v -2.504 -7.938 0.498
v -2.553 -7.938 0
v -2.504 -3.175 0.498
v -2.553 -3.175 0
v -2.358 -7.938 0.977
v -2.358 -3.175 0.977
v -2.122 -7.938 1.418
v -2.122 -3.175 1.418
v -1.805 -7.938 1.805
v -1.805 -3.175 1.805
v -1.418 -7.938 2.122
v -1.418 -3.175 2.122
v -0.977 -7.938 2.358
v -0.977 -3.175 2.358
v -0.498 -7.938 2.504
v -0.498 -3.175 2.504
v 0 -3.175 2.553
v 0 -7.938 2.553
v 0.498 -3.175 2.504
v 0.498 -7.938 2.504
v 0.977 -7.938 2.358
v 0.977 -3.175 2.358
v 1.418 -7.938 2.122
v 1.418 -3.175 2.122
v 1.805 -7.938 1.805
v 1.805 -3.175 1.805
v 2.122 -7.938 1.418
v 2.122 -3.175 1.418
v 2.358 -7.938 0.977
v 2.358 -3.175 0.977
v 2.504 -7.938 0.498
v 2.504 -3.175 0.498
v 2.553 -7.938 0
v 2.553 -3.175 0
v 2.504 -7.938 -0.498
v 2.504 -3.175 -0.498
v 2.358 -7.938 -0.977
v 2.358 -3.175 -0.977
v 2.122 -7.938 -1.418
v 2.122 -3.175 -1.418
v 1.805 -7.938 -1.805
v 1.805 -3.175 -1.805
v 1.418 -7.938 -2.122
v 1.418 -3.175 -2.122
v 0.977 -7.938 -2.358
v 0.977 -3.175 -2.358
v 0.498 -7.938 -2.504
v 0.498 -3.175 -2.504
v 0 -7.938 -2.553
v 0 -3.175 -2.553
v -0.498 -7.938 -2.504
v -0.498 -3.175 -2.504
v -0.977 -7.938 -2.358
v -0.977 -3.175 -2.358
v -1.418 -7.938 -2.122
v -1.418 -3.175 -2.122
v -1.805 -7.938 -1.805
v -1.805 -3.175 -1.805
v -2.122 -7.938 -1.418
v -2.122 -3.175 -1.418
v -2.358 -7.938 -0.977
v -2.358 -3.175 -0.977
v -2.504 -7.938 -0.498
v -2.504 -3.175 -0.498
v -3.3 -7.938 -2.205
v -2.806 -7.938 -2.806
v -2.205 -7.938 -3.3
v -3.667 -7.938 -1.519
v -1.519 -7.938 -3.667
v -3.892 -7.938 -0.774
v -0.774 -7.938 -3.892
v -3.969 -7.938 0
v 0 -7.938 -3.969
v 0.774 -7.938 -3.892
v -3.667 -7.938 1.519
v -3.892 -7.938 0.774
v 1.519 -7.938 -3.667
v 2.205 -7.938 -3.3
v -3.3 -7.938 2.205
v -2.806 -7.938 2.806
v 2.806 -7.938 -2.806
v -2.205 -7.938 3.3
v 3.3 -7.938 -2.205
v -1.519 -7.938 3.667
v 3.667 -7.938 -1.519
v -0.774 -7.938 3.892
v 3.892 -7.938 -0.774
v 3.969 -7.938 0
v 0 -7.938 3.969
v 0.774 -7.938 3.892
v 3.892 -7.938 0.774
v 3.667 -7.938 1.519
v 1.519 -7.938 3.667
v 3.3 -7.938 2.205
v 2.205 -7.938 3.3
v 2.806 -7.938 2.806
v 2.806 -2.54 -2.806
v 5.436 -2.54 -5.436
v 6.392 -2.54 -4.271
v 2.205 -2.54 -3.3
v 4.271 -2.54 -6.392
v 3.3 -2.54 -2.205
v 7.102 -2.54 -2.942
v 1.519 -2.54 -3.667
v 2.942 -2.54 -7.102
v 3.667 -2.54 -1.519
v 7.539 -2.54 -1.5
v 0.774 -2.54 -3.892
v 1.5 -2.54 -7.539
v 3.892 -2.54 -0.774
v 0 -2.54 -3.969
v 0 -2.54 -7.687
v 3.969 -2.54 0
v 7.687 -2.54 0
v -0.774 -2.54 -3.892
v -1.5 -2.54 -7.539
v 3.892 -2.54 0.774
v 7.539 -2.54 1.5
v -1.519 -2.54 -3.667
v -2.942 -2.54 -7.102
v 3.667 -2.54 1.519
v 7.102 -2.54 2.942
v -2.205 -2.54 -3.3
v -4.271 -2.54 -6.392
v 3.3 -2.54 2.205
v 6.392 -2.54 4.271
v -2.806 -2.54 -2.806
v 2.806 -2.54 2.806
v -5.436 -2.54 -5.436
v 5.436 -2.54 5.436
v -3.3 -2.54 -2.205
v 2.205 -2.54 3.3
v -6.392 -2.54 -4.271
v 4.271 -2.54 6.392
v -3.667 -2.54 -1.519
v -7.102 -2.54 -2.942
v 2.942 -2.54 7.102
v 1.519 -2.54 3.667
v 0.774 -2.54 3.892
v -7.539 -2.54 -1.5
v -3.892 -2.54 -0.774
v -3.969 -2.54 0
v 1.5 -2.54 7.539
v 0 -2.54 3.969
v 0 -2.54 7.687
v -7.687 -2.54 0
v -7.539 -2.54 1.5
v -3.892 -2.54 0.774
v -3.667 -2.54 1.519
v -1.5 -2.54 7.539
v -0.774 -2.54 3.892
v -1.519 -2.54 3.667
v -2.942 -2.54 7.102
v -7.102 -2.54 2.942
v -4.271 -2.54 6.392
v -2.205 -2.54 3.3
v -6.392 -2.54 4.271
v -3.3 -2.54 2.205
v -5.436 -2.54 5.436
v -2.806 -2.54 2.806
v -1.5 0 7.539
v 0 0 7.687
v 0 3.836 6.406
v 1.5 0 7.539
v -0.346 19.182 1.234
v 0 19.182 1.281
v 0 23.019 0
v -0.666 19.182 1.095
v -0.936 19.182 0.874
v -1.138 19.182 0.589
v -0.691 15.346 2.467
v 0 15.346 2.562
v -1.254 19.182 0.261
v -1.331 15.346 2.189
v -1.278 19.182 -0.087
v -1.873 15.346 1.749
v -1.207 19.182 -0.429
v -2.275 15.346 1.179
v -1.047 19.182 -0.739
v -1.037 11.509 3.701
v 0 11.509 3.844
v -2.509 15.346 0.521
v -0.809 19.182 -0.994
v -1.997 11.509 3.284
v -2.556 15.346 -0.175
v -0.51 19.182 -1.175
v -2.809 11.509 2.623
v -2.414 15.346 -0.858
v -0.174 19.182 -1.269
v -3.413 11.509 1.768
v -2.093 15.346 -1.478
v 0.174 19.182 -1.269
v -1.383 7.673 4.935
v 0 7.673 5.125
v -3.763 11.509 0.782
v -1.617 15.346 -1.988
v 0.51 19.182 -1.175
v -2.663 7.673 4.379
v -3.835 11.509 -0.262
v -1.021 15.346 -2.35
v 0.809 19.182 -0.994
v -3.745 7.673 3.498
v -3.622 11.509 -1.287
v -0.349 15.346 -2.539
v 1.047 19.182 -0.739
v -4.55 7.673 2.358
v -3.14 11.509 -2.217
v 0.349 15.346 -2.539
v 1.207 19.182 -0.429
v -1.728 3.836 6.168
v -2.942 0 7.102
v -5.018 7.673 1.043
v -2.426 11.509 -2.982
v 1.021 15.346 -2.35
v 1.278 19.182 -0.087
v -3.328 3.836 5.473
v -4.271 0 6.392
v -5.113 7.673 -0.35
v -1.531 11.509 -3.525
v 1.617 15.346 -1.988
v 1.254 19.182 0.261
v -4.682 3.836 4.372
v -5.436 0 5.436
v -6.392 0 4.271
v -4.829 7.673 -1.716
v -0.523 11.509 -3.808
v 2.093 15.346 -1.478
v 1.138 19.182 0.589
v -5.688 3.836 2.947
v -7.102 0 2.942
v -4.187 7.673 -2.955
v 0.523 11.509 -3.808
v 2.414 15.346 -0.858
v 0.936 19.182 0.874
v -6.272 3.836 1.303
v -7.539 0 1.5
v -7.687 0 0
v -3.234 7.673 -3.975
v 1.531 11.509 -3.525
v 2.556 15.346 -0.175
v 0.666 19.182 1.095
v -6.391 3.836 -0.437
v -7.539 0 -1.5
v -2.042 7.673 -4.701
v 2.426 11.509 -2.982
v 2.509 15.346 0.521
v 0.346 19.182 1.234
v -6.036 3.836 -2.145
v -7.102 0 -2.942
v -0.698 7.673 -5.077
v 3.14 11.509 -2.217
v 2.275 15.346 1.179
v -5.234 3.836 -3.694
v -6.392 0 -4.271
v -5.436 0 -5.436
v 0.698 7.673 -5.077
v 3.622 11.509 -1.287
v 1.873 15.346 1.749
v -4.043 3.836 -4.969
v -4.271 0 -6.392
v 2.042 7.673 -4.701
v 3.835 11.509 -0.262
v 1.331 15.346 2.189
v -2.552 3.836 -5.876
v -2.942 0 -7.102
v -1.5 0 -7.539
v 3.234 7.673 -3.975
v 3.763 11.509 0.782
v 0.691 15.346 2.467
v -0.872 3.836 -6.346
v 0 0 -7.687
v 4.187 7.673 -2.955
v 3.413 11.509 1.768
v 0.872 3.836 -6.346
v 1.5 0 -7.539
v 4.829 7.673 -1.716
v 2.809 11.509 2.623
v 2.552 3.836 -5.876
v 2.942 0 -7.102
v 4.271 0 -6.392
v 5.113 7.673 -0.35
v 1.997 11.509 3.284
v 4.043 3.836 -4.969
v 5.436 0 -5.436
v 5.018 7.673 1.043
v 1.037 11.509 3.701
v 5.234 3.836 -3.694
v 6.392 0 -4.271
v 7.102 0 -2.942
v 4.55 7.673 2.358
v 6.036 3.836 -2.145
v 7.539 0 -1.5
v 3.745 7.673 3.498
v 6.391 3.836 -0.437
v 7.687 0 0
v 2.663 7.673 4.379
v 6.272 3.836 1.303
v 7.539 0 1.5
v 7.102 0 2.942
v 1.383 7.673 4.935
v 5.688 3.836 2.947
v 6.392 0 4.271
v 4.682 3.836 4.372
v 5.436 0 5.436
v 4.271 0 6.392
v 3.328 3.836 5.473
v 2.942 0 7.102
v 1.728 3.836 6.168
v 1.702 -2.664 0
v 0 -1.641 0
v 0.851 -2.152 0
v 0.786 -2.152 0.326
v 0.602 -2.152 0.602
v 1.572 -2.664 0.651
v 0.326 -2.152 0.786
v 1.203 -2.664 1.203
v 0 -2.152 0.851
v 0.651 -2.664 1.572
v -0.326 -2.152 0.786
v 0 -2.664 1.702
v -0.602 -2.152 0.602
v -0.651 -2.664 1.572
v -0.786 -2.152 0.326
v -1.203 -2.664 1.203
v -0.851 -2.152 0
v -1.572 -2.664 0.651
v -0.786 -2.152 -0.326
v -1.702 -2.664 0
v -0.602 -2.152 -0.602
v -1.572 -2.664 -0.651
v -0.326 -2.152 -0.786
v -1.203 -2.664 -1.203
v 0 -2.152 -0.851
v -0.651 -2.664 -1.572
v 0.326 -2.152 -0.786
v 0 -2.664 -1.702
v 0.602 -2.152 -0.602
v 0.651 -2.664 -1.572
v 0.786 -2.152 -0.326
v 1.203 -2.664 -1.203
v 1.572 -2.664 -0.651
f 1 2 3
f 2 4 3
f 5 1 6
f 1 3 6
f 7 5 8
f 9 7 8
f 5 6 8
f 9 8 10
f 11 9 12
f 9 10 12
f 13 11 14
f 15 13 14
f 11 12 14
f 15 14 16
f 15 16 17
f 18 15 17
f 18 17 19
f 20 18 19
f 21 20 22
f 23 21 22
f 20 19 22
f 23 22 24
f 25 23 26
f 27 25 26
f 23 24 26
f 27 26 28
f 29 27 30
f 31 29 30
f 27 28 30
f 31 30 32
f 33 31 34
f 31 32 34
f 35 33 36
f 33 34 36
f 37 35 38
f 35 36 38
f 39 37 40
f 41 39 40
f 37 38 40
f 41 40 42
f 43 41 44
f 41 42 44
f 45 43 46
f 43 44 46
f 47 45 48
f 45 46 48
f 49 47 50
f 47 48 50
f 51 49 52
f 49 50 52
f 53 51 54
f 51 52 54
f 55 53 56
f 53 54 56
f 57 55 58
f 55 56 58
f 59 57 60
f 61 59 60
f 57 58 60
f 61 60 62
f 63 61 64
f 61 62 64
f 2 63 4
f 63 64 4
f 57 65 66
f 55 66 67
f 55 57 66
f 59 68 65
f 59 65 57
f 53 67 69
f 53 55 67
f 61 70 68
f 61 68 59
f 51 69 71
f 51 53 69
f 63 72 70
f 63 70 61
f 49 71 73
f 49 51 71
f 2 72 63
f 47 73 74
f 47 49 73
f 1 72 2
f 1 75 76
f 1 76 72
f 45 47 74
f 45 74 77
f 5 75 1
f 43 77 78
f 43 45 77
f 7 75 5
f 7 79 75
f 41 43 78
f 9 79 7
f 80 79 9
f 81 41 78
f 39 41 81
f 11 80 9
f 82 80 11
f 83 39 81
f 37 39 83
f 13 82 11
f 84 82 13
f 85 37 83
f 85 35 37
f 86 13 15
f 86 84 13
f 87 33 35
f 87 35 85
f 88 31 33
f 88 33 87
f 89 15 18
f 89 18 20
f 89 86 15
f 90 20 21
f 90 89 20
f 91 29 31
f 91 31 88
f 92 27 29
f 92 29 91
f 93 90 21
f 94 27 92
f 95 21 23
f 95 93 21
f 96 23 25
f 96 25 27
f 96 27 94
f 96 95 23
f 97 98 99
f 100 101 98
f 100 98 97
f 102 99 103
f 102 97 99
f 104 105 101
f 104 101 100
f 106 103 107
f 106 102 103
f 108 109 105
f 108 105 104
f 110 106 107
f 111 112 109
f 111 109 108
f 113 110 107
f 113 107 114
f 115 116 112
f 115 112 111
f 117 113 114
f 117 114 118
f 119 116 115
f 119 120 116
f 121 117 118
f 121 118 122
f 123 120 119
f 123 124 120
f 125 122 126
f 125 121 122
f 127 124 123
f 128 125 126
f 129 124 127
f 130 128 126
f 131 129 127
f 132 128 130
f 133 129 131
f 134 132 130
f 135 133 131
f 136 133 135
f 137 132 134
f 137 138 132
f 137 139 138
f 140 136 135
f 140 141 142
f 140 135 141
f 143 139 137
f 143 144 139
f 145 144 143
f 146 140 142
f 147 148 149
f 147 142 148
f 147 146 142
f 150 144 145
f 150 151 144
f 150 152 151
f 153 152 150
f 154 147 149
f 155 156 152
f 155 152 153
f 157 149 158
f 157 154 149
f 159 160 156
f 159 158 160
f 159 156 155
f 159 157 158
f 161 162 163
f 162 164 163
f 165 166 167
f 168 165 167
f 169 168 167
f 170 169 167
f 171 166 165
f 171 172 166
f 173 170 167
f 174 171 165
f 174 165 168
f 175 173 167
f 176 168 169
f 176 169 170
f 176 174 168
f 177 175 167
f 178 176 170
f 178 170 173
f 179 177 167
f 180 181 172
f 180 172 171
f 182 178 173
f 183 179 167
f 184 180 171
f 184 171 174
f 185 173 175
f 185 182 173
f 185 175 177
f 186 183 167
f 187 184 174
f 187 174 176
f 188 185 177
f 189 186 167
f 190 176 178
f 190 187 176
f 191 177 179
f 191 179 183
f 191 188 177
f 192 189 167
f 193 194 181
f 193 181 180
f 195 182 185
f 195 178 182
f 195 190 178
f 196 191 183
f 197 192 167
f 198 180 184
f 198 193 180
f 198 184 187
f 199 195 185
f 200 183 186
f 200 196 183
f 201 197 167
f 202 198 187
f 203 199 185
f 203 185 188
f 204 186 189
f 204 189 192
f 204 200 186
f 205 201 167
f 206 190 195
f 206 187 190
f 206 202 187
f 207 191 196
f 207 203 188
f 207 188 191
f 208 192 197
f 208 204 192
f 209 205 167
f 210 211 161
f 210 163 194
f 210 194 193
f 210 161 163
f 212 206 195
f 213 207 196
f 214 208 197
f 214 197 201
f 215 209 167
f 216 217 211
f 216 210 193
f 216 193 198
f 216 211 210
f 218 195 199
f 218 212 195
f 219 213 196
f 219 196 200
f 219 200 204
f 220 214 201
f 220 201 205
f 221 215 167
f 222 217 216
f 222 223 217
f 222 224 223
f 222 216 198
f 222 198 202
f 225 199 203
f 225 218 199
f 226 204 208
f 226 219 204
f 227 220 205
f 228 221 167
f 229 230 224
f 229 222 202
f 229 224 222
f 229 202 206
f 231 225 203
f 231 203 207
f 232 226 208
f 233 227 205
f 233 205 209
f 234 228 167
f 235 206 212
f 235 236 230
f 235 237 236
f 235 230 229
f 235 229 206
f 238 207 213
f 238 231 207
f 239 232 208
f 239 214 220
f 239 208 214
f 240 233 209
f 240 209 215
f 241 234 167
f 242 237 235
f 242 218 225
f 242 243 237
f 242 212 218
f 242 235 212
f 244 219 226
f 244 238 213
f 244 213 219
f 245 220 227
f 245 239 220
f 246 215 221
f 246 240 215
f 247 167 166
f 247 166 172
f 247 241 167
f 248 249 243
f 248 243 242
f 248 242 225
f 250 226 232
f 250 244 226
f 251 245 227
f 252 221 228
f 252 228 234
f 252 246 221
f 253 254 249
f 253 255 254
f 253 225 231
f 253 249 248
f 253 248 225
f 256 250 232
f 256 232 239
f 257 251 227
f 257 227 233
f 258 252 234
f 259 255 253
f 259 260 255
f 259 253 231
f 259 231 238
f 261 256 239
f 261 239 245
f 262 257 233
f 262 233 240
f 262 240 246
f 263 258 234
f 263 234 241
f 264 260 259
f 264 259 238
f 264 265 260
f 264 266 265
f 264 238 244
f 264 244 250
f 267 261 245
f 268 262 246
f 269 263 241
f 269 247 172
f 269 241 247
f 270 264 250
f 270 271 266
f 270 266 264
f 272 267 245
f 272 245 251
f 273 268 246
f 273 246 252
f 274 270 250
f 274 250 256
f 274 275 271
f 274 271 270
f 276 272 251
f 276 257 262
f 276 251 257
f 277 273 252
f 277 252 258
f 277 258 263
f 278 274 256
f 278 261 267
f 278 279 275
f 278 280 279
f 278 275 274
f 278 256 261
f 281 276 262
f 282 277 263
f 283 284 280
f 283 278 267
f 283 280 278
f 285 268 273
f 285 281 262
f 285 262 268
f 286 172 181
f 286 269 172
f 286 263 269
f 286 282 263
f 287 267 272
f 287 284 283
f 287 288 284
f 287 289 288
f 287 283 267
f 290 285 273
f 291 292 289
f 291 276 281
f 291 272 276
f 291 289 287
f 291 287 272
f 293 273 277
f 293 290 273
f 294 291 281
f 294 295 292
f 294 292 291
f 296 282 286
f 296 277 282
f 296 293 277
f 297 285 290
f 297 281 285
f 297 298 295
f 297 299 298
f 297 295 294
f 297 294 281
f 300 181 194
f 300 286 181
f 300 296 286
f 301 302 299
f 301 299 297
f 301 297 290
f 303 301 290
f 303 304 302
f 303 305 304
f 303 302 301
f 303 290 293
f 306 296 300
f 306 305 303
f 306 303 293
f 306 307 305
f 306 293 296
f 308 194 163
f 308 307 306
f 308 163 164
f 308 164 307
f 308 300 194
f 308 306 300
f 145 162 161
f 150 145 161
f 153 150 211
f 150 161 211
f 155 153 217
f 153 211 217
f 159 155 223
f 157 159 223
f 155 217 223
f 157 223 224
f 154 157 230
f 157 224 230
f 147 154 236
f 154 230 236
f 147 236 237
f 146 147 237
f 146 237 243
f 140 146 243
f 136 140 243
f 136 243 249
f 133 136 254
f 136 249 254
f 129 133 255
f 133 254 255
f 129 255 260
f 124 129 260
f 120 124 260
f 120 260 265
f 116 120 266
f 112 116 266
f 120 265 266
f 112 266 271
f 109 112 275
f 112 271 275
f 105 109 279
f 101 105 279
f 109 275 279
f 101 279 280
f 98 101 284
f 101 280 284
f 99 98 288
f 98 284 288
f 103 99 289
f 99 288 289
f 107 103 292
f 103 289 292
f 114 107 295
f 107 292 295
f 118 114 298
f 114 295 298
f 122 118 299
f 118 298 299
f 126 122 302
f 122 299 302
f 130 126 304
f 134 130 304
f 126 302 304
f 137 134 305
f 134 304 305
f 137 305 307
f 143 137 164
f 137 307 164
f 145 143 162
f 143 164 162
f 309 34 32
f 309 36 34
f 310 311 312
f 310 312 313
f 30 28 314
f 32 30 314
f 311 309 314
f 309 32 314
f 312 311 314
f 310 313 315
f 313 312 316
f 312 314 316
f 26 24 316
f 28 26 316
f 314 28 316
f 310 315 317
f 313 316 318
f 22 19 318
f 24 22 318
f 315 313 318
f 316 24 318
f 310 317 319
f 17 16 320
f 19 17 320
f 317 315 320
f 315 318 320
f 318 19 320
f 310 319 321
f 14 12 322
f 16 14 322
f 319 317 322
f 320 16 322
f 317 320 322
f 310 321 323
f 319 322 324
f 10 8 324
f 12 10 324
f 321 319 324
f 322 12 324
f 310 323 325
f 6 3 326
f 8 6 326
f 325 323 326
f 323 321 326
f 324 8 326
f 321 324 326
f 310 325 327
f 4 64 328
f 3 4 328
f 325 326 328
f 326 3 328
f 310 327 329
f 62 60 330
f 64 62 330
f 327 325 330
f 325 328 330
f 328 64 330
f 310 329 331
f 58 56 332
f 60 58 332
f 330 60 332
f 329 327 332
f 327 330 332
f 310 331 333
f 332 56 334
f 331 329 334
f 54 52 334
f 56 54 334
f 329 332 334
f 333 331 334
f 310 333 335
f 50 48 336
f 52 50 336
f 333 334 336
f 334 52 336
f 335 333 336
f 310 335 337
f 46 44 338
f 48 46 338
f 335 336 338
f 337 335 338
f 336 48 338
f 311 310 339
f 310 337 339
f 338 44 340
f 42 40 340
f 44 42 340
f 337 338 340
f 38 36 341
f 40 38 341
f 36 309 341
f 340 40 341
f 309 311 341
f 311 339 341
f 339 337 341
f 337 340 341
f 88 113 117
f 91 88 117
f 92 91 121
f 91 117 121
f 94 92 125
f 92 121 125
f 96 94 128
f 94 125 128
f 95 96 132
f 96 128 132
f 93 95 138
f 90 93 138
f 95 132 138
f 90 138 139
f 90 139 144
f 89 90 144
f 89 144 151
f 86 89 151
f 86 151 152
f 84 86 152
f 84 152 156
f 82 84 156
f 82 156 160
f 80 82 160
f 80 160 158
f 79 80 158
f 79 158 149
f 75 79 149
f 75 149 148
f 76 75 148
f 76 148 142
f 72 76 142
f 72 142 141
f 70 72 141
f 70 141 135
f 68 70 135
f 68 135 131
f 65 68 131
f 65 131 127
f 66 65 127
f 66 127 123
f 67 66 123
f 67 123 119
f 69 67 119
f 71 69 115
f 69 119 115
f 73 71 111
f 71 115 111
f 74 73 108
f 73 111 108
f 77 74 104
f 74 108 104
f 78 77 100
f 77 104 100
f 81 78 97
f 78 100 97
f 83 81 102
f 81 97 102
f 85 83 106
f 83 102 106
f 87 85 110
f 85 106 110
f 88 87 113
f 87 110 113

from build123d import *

# Parameters (mm, degrees)
F0_R     = 3.96875
F1_DEPTH = 7.9375
F3_D     = 5.1054
F3_DEPTH = 4.7625
F3_TIP   = 1.5338169022
F6_DEPTH = 2.54


with BuildPart() as f1:
    # F0 (on Front) → F1 (new body)
    with BuildSketch(Plane.XZ):
        Circle(F0_R)
    extrude(amount=F1_DEPTH)

    # F3
    with Locations(Plane.XZ.offset(7.9375)):
        with Locations((0, 0)):
            Hole(F3_D / 2, depth=F3_DEPTH)
            with Locations((0, 0, -(F3_DEPTH + F3_TIP / 2))):  # 118° drill point
                Cone(0, F3_D / 2, F3_TIP, mode=Mode.SUBTRACT)

    # F4 (on Right) → F5 (revolve)
    with BuildSketch(Plane.YZ):
        Polygon((0, 7.68720332), (0, 0), (23.01875, 0), align=None)
    revolve(axis=Axis((0, 11.509375, 0), (0, -1, 0)))

    # F6 (add): a face of the model
    f6_faces = [f1.faces().sort_by_distance(p)[0] for p in [
        (0, 0, -7.4697763762),
    ]]
    extrude(f6_faces, amount=F6_DEPTH)


solid = f1.part
